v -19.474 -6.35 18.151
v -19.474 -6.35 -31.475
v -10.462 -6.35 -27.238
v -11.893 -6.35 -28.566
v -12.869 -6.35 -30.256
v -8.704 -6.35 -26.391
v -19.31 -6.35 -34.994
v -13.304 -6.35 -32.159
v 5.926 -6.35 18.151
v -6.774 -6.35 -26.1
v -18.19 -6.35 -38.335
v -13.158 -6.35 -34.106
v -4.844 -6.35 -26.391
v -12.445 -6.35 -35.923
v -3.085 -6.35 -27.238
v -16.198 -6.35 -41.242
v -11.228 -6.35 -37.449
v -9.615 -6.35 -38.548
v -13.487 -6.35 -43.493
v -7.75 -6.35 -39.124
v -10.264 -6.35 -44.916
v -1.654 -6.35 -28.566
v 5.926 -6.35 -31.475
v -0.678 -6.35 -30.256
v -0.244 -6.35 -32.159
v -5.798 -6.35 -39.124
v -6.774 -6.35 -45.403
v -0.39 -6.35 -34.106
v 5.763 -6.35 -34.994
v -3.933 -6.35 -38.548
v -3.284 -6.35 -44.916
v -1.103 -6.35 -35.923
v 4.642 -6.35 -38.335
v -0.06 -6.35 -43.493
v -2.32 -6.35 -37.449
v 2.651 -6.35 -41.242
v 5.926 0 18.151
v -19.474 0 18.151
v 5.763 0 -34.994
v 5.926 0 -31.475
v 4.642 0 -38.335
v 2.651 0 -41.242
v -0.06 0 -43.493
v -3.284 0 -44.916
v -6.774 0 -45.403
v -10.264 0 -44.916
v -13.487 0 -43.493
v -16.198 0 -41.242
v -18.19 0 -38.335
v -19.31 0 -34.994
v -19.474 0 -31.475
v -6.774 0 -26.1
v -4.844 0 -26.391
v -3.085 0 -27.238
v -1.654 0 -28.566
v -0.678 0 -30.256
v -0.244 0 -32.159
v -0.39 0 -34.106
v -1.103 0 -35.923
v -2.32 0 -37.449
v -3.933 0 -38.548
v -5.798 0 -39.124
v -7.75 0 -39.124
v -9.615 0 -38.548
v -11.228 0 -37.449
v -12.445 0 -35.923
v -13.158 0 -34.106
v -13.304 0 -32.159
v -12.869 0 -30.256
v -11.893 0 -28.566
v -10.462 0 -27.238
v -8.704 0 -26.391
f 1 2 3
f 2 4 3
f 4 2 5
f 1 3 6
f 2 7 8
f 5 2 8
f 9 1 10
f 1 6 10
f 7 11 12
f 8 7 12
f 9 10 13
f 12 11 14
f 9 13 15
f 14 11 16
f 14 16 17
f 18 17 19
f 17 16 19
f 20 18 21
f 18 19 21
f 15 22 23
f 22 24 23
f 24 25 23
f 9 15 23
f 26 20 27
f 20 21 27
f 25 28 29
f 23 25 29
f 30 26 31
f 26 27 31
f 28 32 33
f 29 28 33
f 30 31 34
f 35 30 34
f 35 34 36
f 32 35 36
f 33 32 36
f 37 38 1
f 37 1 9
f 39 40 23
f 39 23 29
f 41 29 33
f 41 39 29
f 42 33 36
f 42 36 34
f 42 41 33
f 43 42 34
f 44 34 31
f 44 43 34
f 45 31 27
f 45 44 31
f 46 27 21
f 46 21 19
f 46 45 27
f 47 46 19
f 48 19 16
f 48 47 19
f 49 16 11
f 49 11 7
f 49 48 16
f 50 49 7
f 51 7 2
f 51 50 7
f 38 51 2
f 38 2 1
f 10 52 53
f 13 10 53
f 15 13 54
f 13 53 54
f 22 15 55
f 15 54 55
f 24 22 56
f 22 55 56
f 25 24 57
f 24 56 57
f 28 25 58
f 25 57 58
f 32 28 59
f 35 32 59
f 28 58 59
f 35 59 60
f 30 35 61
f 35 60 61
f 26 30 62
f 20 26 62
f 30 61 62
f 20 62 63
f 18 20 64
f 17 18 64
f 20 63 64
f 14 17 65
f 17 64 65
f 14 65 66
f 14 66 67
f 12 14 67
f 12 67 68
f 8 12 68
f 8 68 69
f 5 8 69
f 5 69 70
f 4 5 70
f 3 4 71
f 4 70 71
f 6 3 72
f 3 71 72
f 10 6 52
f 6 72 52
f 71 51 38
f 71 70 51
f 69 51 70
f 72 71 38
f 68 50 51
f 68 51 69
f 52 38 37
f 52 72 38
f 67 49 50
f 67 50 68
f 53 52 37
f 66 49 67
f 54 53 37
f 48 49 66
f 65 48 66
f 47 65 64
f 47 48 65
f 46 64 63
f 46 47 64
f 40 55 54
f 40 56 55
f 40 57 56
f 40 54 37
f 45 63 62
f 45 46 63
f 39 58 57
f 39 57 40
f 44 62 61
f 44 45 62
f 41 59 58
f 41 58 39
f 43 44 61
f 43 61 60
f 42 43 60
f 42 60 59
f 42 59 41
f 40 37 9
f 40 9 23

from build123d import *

# Parameters (mm, degrees)
SKETCH1_R           = 6.54812
BOSS_EXTRUDE3_DEPTH = 6.35


with BuildPart() as part:
    # Sketch1 → Boss-Extrude3 (new body)
    with BuildSketch(Plane(origin=(0, 0, 0), x_dir=(1, 0, 0), z_dir=(0, 1, 0))):
        with BuildLine():
            Line((-19.473738898, 31.474503951), (-19.473738898, -18.151447985))
            Line((-19.473738898, -18.151447985), (5.926261102, -18.151447985))
            Line((5.926261102, -18.151447985), (5.926261102, 31.474503951))
            ThreePointArc((5.926261102, 31.474503951), (-6.773738898, 45.402703843), (-19.473738898, 31.474503951))
        make_face()
        with Locations((-6.773738898, 32.648552015)):
            Circle(SKETCH1_R, mode=Mode.SUBTRACT)
    extrude(amount=-BOSS_EXTRUDE3_DEPTH)


solid = part.part
